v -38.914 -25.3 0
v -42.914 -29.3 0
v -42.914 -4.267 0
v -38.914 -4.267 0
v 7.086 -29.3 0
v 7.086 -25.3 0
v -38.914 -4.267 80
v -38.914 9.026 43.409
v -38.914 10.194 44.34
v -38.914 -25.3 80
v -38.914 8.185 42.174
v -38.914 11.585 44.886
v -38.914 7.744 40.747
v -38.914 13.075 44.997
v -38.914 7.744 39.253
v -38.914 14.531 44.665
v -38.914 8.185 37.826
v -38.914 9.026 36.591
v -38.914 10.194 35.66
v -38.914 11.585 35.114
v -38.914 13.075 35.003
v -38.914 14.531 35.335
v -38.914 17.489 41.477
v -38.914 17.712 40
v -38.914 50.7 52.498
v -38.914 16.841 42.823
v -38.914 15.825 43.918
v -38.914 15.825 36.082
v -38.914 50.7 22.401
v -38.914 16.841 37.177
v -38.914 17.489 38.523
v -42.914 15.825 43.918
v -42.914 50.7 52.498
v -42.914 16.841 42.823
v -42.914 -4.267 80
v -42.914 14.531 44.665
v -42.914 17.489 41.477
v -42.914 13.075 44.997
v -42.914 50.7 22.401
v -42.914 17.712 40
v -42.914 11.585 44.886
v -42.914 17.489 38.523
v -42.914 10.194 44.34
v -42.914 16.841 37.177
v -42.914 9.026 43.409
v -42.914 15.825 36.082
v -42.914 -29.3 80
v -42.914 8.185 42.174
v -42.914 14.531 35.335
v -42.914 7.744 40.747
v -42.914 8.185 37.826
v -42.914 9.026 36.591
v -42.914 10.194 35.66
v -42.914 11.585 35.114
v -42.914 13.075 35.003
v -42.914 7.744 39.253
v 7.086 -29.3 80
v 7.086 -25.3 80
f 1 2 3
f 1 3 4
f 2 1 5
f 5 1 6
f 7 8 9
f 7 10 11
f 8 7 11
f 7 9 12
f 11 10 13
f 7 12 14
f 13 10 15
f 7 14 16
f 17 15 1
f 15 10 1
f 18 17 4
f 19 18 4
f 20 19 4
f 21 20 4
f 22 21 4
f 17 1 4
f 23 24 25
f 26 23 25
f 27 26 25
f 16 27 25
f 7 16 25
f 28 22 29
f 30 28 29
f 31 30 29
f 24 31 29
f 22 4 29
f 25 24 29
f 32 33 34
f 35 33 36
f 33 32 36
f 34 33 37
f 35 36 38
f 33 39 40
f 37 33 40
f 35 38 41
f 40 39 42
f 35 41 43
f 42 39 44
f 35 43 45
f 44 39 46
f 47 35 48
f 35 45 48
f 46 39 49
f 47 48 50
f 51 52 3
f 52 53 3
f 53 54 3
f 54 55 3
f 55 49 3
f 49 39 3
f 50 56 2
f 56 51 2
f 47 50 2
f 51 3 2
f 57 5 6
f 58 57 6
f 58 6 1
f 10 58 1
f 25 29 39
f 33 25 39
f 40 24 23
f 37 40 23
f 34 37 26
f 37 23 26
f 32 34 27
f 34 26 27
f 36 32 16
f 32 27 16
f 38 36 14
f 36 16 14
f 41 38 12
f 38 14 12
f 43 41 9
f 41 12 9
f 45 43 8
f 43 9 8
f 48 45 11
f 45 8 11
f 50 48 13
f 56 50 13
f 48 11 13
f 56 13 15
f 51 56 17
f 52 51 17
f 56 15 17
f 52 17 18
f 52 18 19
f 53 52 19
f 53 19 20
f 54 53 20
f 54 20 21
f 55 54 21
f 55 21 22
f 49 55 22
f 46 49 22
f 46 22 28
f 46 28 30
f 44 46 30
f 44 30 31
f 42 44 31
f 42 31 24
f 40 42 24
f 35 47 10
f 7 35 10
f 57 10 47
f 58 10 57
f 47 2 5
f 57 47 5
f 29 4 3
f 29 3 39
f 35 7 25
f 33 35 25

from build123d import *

# Parameters (mm, degrees)
BOSS_EXTRUDE1_DEPTH = 80
SKETCH2_R           = 5.0115
CUT_EXTRUDE1_DEPTH  = 80
CUT_EXTRUDE2_DEPTH  = 80


with BuildPart() as part:
    # Sketch1 → Boss-Extrude1 (new body)
    with BuildSketch(Plane.XY):
        Polygon((-42.913522538, 50.7), (-42.913522538, -29.3), (7.086477462, -29.3), (7.086477462, -25.3), (-38.913522538, -25.3), (-38.913522538, 50.7), align=None)
    extrude(amount=BOSS_EXTRUDE1_DEPTH)

    # Sketch2 → Cut-Extrude1 (cut)
    with BuildSketch(Plane(origin=(-38.913522538, 0, 0), x_dir=(0, 0, -1), z_dir=(1, 0, 0))):
        with Locations(Location((-40, 12.7, 0), (0, 0, 90))):
            Circle(SKETCH2_R)
    extrude(amount=-CUT_EXTRUDE1_DEPTH, mode=Mode.SUBTRACT)

    # Sketch3 → Cut-Extrude2 (cut)
    with BuildSketch(Plane(origin=(0, 0, 0), x_dir=(0, 0, -1), z_dir=(1, 0, 0))):
        Polygon((-80, -4.267166785), (-52.498027081, 50.7), (-80, 50.7), align=None)
        Polygon((0, -4.267166785), (-22.400737376, 50.7), (0, 50.7), align=None)
    extrude(amount=-CUT_EXTRUDE2_DEPTH, mode=Mode.SUBTRACT)


solid = part.part
